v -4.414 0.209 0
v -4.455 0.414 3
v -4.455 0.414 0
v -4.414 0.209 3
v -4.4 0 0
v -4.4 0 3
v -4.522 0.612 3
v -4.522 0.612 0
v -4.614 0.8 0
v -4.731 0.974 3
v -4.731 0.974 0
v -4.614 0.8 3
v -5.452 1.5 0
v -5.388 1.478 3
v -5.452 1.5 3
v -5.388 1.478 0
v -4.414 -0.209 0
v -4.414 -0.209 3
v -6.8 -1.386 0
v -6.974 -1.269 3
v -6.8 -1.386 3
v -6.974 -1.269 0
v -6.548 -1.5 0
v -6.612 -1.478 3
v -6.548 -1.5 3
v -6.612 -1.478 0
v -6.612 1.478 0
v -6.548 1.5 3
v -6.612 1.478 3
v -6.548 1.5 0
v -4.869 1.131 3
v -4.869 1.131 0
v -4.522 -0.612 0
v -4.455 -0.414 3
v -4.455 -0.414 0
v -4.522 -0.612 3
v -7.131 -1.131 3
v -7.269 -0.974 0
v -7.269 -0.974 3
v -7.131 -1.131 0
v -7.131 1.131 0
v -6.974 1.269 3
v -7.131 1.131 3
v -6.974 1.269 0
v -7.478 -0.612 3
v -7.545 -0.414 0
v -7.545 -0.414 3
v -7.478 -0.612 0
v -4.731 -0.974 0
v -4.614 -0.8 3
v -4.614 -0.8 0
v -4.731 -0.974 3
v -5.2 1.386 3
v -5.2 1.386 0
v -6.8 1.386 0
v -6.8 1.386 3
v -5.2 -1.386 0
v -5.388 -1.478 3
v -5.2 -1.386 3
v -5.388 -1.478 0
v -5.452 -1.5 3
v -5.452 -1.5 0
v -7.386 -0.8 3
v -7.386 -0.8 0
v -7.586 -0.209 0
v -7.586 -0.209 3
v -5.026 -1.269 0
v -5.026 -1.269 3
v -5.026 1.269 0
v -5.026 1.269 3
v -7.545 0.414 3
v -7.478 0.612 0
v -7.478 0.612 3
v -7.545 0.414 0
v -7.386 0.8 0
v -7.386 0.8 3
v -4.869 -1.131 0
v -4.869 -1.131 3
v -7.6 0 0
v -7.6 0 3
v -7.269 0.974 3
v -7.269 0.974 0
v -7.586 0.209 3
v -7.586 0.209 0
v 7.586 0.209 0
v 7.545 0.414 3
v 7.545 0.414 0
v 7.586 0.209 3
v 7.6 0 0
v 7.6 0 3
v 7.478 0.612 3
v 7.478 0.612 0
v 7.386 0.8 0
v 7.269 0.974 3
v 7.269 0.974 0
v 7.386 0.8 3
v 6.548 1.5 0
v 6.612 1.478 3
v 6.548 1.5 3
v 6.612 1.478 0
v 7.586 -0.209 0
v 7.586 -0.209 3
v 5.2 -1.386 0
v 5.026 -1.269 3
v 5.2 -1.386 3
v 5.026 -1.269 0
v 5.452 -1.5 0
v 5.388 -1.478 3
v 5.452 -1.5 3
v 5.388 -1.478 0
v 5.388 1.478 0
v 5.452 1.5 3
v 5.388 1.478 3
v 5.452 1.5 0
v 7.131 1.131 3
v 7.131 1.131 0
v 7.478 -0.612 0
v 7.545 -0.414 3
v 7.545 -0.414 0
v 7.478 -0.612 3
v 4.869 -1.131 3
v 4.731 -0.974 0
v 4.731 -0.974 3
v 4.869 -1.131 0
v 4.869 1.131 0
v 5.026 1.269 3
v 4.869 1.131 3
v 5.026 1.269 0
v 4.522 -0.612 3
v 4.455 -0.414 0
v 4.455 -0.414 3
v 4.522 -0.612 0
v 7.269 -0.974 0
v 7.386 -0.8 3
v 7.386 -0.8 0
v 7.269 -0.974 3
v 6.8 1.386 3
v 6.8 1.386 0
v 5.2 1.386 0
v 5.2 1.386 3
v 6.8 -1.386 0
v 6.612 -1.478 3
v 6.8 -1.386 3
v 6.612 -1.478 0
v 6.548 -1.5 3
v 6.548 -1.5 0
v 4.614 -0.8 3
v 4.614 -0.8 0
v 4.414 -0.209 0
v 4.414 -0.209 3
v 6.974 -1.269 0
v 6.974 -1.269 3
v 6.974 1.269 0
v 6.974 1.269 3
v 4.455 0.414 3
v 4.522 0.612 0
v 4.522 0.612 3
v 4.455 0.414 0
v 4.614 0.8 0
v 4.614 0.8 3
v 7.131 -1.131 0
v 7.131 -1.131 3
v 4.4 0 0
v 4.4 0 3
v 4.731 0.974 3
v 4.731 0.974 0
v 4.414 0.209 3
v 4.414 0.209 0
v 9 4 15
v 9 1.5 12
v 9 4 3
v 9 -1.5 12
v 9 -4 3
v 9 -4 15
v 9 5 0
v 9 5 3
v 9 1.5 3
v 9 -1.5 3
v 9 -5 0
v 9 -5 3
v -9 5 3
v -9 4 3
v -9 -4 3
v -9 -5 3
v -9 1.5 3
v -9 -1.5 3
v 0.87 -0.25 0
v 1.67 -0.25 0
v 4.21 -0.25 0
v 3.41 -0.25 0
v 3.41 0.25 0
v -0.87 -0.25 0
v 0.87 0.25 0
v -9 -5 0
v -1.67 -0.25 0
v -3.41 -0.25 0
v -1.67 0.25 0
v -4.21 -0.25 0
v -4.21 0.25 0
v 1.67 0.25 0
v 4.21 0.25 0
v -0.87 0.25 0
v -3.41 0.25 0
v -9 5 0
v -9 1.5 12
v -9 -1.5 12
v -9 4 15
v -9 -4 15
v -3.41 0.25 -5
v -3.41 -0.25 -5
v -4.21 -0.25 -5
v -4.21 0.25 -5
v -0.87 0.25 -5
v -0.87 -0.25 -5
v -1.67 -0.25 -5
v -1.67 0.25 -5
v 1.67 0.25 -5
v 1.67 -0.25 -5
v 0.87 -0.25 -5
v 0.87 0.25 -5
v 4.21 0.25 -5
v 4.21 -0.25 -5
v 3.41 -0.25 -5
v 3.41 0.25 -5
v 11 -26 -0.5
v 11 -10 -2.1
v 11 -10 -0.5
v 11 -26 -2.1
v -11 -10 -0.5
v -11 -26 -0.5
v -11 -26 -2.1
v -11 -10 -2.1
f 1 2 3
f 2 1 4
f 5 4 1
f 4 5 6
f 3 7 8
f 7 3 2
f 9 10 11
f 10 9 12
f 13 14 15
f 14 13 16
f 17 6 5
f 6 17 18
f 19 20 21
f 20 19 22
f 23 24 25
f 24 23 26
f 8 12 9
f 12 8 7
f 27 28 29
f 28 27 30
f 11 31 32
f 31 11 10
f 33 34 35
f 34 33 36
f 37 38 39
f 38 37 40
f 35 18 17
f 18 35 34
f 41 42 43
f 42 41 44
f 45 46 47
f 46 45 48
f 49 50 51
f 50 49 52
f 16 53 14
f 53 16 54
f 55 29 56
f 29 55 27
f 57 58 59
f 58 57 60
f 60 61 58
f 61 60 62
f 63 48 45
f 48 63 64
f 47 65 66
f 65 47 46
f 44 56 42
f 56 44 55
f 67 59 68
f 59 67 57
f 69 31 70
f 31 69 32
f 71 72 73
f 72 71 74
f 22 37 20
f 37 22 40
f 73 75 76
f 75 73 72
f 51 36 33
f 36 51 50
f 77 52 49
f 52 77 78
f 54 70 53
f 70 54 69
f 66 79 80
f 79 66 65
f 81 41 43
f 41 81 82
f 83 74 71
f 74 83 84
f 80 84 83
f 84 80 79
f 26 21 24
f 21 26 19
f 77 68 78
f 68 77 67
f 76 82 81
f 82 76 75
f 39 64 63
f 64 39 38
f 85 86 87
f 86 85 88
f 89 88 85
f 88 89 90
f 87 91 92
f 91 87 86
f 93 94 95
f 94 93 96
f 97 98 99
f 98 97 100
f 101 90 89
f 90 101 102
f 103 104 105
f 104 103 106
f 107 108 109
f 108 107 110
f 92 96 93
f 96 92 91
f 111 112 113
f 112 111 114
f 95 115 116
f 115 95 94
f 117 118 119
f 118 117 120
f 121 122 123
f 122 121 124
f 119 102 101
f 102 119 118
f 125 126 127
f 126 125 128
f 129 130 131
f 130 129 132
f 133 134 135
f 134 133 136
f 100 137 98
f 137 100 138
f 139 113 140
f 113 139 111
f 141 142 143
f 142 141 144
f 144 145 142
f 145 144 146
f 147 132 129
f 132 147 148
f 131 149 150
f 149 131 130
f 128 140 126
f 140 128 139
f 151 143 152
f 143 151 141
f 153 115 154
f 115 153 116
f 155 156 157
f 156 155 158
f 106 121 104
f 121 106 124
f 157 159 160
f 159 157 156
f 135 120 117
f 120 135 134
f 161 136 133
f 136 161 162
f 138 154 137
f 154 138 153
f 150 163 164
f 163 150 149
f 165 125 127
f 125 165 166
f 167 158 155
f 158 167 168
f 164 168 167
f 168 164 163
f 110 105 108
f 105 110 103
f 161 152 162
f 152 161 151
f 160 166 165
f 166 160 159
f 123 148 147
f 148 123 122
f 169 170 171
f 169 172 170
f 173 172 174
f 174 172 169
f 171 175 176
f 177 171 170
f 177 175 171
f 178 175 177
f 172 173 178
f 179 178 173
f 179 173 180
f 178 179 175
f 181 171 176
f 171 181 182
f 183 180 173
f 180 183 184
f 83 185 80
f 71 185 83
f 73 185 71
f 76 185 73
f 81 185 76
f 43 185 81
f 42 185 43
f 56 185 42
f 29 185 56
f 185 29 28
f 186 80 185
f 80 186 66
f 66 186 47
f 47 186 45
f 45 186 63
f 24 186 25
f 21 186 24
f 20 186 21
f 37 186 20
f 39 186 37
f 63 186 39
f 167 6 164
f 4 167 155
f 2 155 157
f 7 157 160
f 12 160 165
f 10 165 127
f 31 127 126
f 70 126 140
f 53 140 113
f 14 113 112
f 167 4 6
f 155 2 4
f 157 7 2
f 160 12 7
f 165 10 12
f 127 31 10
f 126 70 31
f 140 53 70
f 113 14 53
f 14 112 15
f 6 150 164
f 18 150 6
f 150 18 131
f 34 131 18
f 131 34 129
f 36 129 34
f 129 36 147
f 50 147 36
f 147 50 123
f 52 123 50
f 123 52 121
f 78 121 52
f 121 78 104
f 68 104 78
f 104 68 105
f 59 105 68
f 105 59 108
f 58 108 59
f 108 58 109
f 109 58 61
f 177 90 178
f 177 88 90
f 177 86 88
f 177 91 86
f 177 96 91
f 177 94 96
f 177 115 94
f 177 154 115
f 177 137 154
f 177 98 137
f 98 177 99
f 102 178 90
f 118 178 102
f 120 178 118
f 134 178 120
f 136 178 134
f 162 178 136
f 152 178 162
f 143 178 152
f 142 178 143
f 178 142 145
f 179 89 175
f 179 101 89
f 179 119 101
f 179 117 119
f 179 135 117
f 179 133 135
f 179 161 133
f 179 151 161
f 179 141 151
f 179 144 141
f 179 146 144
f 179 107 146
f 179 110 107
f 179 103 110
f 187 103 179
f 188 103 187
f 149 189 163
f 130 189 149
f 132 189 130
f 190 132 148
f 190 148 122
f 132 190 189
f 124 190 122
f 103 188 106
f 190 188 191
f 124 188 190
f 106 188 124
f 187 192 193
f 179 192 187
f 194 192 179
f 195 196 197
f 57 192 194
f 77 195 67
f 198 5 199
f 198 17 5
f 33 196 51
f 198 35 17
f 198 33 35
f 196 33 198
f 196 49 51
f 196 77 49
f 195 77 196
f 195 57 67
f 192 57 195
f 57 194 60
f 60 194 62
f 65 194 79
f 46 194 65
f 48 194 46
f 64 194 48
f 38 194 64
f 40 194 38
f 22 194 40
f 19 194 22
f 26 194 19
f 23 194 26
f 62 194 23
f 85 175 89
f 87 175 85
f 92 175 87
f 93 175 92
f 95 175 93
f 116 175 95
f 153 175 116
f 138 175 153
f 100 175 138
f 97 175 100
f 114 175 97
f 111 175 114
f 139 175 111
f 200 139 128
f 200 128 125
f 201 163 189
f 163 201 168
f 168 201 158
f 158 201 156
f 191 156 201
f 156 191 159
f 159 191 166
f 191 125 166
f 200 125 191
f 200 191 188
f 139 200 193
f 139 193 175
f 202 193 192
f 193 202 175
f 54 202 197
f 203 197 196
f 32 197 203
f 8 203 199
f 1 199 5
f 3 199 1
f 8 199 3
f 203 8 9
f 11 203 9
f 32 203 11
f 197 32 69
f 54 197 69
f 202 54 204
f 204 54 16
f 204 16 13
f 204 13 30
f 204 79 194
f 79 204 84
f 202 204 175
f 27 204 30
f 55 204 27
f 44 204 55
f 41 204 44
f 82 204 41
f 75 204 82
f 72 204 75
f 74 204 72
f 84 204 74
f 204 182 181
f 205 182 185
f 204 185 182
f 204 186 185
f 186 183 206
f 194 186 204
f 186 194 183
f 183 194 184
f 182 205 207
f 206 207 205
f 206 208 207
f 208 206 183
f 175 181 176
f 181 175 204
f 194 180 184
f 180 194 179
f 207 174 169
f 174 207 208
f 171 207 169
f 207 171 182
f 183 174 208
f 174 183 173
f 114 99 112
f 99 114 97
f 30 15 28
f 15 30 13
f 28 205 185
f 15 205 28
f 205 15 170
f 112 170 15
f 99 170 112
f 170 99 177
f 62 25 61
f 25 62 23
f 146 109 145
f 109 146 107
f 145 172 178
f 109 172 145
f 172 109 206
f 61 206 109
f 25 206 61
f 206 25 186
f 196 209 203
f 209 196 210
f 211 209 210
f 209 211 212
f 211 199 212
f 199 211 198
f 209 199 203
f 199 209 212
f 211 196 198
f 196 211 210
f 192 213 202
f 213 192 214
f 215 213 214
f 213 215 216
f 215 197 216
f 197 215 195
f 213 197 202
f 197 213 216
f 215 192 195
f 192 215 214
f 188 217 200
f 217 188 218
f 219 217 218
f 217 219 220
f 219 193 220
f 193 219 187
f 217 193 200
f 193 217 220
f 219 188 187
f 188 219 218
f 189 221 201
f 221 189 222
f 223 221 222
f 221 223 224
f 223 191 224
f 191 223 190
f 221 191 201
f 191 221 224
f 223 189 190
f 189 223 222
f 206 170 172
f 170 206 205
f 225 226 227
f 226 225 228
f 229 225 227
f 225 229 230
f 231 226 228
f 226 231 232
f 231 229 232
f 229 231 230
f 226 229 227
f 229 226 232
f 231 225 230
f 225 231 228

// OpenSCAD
// Parameters
base_width = 18; //[9:36:1]
base_height = 3; //[1.5:6:0.5]
base_depth = 10; //[5:20:1]
hole_diameter = 3.2; //[1.6:6.4:0.1]
hole_spacing = 12; //[6:24:1]
gap_width = 3; //[1.5:6:0.5]
gap_height = 12; //[6:24:1]
stem_width = 2.5; //[1.25:5:0.25]
pcb_thickness = 1.6; //[0.8:3.2:0.1]
pcb_width = 22; //[11:44:1]
pcb_depth = 16; //[8:32:1]
pcb_offset_y = 6; //[0:12:1]
overlap = 1; //[0.5:2:0.1]
pcb_enabled = 1; //[0:1:1]

$fn = 48;

module photo_interrupter() {

  // Derived dimensions (formulas only)
  arm_h   = base_height + gap_height;     // total fork height above base bottom
  base_z  = base_height/2;
  body_z  = arm_h/2;

  // Fork outer dimensions
  outer_y = gap_width + 2*stem_width;
  outer_z = arm_h;

  // Top bridge (cap)
  bridge_h = max(base_height, 2);
  bridge_z = base_height + gap_height - bridge_h/2;

  // Lead pins
  lead_w = 0.8;
  lead_t = 0.5;
  lead_len = 6;
  lead_pitch = 2.54;
  lead_count = 4;
  leads_span = (lead_count-1)*lead_pitch;

  // PCB placement: fuse to underside of base with overlap
  pcb_z = -(base_height/2 + pcb_thickness/2 - overlap);
  // Place PCB so its top face slightly intersects base bottom (z=0 plane)
  pcb_y = -(base_depth/2 + pcb_depth/2 - overlap + pcb_offset_y);

  // Ensure non-degenerate geometry
  eps = 0.01;

  union() {

    // Package + leads (single solid)
    union() {

      // Mounting base with holes
      difference() {
        translate([0, 0, base_z])
          cube([base_width, base_depth, base_height], center=true);

        for (sx = [-1, 1])
          translate([sx*hole_spacing/2, 0, base_z])
            cylinder(r=hole_diameter/2, h=base_height + 2*overlap + eps, center=true);
      }

      // Fork body: outer block minus slot (U-shaped gap)
      difference() {
        translate([0, 0, body_z])
          cube([base_width, outer_y, outer_z], center=true);

        translate([0, 0, body_z])
          cube([base_width + 2*overlap + eps, gap_width, outer_z + 2*overlap + eps], center=true);
      }

      // Top bridge/cap (connected to fork)
      translate([0, 0, bridge_z])
        cube([base_width, outer_y, bridge_h], center=true);

      // Leads under base (connected to base underside with overlap)
      for (i = [0:lead_count-1]) {
        x = -leads_span/2 + i*lead_pitch;
        translate([x, 0, -(lead_len/2 - overlap)])
          cube([lead_w, lead_t, lead_len], center=true);
      }
    }

    // PCB (fused to base so whole model is one connected solid)
    if (pcb_enabled) {
      translate([0, pcb_y, pcb_z])
        cube([pcb_width, pcb_depth, pcb_thickness], center=true);
    }
  }
}

photo_interrupter();
